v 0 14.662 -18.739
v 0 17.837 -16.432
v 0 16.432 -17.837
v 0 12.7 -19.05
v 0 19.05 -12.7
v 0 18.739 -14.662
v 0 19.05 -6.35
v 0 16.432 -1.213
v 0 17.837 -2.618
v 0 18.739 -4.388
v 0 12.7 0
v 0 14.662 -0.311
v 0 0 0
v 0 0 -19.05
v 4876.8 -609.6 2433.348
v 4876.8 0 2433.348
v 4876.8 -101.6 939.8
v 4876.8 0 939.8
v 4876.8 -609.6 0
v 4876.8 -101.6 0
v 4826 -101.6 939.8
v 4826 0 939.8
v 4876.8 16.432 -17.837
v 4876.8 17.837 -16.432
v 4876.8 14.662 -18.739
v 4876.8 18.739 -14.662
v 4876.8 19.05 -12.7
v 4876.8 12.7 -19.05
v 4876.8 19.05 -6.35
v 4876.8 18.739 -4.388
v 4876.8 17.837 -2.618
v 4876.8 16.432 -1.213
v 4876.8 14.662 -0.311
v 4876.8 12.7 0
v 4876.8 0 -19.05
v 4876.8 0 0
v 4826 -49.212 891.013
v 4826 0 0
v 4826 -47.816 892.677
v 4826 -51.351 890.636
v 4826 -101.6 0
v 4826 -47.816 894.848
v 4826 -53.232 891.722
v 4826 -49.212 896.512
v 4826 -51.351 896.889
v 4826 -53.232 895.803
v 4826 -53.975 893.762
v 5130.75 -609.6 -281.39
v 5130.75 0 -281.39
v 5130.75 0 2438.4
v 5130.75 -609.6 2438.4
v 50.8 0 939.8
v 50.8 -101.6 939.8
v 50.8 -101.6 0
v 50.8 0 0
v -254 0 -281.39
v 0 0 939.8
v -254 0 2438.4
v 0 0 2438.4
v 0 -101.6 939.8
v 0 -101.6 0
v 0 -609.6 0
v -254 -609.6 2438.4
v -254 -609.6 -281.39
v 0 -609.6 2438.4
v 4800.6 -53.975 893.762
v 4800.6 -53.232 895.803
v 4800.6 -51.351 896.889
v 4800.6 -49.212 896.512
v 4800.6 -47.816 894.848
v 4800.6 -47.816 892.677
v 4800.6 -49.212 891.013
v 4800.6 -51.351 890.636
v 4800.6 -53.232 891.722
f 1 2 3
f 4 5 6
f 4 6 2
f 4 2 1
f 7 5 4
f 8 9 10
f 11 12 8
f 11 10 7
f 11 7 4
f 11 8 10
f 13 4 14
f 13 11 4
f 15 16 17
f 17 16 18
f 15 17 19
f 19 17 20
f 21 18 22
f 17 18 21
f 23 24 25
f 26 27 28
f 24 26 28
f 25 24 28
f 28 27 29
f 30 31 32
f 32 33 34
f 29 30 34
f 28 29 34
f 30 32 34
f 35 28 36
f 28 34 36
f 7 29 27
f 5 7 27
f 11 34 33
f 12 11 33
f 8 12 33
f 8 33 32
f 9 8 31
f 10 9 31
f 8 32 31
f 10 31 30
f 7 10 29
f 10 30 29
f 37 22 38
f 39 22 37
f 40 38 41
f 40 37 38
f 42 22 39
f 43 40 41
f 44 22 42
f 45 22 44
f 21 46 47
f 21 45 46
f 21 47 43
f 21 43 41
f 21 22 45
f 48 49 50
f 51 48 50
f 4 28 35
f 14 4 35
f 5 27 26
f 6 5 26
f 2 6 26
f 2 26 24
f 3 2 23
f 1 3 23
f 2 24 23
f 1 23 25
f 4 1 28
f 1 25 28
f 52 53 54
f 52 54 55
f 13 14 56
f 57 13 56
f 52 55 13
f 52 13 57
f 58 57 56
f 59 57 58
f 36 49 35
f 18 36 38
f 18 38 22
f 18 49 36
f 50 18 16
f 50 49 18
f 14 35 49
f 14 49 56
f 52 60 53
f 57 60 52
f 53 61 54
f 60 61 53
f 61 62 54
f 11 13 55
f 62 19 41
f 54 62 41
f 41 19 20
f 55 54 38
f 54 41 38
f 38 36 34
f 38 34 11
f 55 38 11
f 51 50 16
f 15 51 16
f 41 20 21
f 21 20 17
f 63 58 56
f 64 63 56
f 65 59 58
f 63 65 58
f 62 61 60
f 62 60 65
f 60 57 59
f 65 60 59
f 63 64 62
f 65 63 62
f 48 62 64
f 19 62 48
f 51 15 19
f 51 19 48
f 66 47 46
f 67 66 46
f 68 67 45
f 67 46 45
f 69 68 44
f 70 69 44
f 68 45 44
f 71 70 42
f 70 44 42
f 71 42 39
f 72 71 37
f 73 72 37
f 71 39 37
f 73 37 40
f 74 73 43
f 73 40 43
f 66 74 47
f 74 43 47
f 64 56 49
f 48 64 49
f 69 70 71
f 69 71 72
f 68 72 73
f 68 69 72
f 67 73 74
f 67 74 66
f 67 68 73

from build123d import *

# Parameters (mm, degrees)
F1_DEPTH = 609.6
F3_DEPTH = 4876.8
F4_W     = 101.6
F4_H     = 939.8
F5_DEPTH = 50.8
F6_W     = 101.6
F6_H     = 939.8
F7_DEPTH = 50.8
F8_R     = 3.175
F9_DEPTH = 25.4


with BuildPart() as f1:
    # F0 (on Front) → F1 (new body)
    with BuildSketch(Plane.XZ):
        Polygon((4876.8, 0), (0, 0), (0, 2438.4), (-254, 2438.4), (-254, -281.390131), (5130.749751, -281.390131), (5130.749751, 2438.4), (4876.8, 2433.347884), align=None)
    extrude(amount=F1_DEPTH)

    # F2 (on face) → F3 (join)
    with BuildSketch(Plane(origin=(4876.8, 0, 0), x_dir=(0, -1, 0), z_dir=(-1, 0, 0))):
        with BuildLine():
            Line((0, -19.05), (0, 0))
            Line((0, 0), (-12.7, 0))
            ThreePointArc((-12.7, 0), (-17.190128, -1.859872), (-19.05, -6.35))
            Line((-19.05, -6.35), (-19.05, -12.7))
            ThreePointArc((-19.05, -12.7), (-17.190128, -17.190128), (-12.7, -19.05))
            Line((-12.7, -19.05), (0, -19.05))
        make_face()
    extrude(amount=F3_DEPTH)

    # F4 (on face) → F5 (join)
    with BuildSketch(Plane.YZ):
        with Locations((-50.8, 469.9)):
            Rectangle(F4_W, F4_H)
    extrude(amount=F5_DEPTH)

    # F6 (on face) → F7 (join)
    with BuildSketch(Plane(origin=(4876.8, 0, 0), x_dir=(0, -1, 0), z_dir=(-1, 0, 0))):
        with Locations((50.8, 469.9)):
            Rectangle(F6_W, F6_H)
    extrude(amount=F7_DEPTH)

    # F8 (on face) → F9 (join)
    with BuildSketch(Plane(origin=(4826, 0, 0), x_dir=(0, -1, 0), z_dir=(-1, 0, 0))):
        with Locations((50.8, 893.7625)):
            Circle(F8_R)
    extrude(amount=F9_DEPTH)


solid = f1.part
